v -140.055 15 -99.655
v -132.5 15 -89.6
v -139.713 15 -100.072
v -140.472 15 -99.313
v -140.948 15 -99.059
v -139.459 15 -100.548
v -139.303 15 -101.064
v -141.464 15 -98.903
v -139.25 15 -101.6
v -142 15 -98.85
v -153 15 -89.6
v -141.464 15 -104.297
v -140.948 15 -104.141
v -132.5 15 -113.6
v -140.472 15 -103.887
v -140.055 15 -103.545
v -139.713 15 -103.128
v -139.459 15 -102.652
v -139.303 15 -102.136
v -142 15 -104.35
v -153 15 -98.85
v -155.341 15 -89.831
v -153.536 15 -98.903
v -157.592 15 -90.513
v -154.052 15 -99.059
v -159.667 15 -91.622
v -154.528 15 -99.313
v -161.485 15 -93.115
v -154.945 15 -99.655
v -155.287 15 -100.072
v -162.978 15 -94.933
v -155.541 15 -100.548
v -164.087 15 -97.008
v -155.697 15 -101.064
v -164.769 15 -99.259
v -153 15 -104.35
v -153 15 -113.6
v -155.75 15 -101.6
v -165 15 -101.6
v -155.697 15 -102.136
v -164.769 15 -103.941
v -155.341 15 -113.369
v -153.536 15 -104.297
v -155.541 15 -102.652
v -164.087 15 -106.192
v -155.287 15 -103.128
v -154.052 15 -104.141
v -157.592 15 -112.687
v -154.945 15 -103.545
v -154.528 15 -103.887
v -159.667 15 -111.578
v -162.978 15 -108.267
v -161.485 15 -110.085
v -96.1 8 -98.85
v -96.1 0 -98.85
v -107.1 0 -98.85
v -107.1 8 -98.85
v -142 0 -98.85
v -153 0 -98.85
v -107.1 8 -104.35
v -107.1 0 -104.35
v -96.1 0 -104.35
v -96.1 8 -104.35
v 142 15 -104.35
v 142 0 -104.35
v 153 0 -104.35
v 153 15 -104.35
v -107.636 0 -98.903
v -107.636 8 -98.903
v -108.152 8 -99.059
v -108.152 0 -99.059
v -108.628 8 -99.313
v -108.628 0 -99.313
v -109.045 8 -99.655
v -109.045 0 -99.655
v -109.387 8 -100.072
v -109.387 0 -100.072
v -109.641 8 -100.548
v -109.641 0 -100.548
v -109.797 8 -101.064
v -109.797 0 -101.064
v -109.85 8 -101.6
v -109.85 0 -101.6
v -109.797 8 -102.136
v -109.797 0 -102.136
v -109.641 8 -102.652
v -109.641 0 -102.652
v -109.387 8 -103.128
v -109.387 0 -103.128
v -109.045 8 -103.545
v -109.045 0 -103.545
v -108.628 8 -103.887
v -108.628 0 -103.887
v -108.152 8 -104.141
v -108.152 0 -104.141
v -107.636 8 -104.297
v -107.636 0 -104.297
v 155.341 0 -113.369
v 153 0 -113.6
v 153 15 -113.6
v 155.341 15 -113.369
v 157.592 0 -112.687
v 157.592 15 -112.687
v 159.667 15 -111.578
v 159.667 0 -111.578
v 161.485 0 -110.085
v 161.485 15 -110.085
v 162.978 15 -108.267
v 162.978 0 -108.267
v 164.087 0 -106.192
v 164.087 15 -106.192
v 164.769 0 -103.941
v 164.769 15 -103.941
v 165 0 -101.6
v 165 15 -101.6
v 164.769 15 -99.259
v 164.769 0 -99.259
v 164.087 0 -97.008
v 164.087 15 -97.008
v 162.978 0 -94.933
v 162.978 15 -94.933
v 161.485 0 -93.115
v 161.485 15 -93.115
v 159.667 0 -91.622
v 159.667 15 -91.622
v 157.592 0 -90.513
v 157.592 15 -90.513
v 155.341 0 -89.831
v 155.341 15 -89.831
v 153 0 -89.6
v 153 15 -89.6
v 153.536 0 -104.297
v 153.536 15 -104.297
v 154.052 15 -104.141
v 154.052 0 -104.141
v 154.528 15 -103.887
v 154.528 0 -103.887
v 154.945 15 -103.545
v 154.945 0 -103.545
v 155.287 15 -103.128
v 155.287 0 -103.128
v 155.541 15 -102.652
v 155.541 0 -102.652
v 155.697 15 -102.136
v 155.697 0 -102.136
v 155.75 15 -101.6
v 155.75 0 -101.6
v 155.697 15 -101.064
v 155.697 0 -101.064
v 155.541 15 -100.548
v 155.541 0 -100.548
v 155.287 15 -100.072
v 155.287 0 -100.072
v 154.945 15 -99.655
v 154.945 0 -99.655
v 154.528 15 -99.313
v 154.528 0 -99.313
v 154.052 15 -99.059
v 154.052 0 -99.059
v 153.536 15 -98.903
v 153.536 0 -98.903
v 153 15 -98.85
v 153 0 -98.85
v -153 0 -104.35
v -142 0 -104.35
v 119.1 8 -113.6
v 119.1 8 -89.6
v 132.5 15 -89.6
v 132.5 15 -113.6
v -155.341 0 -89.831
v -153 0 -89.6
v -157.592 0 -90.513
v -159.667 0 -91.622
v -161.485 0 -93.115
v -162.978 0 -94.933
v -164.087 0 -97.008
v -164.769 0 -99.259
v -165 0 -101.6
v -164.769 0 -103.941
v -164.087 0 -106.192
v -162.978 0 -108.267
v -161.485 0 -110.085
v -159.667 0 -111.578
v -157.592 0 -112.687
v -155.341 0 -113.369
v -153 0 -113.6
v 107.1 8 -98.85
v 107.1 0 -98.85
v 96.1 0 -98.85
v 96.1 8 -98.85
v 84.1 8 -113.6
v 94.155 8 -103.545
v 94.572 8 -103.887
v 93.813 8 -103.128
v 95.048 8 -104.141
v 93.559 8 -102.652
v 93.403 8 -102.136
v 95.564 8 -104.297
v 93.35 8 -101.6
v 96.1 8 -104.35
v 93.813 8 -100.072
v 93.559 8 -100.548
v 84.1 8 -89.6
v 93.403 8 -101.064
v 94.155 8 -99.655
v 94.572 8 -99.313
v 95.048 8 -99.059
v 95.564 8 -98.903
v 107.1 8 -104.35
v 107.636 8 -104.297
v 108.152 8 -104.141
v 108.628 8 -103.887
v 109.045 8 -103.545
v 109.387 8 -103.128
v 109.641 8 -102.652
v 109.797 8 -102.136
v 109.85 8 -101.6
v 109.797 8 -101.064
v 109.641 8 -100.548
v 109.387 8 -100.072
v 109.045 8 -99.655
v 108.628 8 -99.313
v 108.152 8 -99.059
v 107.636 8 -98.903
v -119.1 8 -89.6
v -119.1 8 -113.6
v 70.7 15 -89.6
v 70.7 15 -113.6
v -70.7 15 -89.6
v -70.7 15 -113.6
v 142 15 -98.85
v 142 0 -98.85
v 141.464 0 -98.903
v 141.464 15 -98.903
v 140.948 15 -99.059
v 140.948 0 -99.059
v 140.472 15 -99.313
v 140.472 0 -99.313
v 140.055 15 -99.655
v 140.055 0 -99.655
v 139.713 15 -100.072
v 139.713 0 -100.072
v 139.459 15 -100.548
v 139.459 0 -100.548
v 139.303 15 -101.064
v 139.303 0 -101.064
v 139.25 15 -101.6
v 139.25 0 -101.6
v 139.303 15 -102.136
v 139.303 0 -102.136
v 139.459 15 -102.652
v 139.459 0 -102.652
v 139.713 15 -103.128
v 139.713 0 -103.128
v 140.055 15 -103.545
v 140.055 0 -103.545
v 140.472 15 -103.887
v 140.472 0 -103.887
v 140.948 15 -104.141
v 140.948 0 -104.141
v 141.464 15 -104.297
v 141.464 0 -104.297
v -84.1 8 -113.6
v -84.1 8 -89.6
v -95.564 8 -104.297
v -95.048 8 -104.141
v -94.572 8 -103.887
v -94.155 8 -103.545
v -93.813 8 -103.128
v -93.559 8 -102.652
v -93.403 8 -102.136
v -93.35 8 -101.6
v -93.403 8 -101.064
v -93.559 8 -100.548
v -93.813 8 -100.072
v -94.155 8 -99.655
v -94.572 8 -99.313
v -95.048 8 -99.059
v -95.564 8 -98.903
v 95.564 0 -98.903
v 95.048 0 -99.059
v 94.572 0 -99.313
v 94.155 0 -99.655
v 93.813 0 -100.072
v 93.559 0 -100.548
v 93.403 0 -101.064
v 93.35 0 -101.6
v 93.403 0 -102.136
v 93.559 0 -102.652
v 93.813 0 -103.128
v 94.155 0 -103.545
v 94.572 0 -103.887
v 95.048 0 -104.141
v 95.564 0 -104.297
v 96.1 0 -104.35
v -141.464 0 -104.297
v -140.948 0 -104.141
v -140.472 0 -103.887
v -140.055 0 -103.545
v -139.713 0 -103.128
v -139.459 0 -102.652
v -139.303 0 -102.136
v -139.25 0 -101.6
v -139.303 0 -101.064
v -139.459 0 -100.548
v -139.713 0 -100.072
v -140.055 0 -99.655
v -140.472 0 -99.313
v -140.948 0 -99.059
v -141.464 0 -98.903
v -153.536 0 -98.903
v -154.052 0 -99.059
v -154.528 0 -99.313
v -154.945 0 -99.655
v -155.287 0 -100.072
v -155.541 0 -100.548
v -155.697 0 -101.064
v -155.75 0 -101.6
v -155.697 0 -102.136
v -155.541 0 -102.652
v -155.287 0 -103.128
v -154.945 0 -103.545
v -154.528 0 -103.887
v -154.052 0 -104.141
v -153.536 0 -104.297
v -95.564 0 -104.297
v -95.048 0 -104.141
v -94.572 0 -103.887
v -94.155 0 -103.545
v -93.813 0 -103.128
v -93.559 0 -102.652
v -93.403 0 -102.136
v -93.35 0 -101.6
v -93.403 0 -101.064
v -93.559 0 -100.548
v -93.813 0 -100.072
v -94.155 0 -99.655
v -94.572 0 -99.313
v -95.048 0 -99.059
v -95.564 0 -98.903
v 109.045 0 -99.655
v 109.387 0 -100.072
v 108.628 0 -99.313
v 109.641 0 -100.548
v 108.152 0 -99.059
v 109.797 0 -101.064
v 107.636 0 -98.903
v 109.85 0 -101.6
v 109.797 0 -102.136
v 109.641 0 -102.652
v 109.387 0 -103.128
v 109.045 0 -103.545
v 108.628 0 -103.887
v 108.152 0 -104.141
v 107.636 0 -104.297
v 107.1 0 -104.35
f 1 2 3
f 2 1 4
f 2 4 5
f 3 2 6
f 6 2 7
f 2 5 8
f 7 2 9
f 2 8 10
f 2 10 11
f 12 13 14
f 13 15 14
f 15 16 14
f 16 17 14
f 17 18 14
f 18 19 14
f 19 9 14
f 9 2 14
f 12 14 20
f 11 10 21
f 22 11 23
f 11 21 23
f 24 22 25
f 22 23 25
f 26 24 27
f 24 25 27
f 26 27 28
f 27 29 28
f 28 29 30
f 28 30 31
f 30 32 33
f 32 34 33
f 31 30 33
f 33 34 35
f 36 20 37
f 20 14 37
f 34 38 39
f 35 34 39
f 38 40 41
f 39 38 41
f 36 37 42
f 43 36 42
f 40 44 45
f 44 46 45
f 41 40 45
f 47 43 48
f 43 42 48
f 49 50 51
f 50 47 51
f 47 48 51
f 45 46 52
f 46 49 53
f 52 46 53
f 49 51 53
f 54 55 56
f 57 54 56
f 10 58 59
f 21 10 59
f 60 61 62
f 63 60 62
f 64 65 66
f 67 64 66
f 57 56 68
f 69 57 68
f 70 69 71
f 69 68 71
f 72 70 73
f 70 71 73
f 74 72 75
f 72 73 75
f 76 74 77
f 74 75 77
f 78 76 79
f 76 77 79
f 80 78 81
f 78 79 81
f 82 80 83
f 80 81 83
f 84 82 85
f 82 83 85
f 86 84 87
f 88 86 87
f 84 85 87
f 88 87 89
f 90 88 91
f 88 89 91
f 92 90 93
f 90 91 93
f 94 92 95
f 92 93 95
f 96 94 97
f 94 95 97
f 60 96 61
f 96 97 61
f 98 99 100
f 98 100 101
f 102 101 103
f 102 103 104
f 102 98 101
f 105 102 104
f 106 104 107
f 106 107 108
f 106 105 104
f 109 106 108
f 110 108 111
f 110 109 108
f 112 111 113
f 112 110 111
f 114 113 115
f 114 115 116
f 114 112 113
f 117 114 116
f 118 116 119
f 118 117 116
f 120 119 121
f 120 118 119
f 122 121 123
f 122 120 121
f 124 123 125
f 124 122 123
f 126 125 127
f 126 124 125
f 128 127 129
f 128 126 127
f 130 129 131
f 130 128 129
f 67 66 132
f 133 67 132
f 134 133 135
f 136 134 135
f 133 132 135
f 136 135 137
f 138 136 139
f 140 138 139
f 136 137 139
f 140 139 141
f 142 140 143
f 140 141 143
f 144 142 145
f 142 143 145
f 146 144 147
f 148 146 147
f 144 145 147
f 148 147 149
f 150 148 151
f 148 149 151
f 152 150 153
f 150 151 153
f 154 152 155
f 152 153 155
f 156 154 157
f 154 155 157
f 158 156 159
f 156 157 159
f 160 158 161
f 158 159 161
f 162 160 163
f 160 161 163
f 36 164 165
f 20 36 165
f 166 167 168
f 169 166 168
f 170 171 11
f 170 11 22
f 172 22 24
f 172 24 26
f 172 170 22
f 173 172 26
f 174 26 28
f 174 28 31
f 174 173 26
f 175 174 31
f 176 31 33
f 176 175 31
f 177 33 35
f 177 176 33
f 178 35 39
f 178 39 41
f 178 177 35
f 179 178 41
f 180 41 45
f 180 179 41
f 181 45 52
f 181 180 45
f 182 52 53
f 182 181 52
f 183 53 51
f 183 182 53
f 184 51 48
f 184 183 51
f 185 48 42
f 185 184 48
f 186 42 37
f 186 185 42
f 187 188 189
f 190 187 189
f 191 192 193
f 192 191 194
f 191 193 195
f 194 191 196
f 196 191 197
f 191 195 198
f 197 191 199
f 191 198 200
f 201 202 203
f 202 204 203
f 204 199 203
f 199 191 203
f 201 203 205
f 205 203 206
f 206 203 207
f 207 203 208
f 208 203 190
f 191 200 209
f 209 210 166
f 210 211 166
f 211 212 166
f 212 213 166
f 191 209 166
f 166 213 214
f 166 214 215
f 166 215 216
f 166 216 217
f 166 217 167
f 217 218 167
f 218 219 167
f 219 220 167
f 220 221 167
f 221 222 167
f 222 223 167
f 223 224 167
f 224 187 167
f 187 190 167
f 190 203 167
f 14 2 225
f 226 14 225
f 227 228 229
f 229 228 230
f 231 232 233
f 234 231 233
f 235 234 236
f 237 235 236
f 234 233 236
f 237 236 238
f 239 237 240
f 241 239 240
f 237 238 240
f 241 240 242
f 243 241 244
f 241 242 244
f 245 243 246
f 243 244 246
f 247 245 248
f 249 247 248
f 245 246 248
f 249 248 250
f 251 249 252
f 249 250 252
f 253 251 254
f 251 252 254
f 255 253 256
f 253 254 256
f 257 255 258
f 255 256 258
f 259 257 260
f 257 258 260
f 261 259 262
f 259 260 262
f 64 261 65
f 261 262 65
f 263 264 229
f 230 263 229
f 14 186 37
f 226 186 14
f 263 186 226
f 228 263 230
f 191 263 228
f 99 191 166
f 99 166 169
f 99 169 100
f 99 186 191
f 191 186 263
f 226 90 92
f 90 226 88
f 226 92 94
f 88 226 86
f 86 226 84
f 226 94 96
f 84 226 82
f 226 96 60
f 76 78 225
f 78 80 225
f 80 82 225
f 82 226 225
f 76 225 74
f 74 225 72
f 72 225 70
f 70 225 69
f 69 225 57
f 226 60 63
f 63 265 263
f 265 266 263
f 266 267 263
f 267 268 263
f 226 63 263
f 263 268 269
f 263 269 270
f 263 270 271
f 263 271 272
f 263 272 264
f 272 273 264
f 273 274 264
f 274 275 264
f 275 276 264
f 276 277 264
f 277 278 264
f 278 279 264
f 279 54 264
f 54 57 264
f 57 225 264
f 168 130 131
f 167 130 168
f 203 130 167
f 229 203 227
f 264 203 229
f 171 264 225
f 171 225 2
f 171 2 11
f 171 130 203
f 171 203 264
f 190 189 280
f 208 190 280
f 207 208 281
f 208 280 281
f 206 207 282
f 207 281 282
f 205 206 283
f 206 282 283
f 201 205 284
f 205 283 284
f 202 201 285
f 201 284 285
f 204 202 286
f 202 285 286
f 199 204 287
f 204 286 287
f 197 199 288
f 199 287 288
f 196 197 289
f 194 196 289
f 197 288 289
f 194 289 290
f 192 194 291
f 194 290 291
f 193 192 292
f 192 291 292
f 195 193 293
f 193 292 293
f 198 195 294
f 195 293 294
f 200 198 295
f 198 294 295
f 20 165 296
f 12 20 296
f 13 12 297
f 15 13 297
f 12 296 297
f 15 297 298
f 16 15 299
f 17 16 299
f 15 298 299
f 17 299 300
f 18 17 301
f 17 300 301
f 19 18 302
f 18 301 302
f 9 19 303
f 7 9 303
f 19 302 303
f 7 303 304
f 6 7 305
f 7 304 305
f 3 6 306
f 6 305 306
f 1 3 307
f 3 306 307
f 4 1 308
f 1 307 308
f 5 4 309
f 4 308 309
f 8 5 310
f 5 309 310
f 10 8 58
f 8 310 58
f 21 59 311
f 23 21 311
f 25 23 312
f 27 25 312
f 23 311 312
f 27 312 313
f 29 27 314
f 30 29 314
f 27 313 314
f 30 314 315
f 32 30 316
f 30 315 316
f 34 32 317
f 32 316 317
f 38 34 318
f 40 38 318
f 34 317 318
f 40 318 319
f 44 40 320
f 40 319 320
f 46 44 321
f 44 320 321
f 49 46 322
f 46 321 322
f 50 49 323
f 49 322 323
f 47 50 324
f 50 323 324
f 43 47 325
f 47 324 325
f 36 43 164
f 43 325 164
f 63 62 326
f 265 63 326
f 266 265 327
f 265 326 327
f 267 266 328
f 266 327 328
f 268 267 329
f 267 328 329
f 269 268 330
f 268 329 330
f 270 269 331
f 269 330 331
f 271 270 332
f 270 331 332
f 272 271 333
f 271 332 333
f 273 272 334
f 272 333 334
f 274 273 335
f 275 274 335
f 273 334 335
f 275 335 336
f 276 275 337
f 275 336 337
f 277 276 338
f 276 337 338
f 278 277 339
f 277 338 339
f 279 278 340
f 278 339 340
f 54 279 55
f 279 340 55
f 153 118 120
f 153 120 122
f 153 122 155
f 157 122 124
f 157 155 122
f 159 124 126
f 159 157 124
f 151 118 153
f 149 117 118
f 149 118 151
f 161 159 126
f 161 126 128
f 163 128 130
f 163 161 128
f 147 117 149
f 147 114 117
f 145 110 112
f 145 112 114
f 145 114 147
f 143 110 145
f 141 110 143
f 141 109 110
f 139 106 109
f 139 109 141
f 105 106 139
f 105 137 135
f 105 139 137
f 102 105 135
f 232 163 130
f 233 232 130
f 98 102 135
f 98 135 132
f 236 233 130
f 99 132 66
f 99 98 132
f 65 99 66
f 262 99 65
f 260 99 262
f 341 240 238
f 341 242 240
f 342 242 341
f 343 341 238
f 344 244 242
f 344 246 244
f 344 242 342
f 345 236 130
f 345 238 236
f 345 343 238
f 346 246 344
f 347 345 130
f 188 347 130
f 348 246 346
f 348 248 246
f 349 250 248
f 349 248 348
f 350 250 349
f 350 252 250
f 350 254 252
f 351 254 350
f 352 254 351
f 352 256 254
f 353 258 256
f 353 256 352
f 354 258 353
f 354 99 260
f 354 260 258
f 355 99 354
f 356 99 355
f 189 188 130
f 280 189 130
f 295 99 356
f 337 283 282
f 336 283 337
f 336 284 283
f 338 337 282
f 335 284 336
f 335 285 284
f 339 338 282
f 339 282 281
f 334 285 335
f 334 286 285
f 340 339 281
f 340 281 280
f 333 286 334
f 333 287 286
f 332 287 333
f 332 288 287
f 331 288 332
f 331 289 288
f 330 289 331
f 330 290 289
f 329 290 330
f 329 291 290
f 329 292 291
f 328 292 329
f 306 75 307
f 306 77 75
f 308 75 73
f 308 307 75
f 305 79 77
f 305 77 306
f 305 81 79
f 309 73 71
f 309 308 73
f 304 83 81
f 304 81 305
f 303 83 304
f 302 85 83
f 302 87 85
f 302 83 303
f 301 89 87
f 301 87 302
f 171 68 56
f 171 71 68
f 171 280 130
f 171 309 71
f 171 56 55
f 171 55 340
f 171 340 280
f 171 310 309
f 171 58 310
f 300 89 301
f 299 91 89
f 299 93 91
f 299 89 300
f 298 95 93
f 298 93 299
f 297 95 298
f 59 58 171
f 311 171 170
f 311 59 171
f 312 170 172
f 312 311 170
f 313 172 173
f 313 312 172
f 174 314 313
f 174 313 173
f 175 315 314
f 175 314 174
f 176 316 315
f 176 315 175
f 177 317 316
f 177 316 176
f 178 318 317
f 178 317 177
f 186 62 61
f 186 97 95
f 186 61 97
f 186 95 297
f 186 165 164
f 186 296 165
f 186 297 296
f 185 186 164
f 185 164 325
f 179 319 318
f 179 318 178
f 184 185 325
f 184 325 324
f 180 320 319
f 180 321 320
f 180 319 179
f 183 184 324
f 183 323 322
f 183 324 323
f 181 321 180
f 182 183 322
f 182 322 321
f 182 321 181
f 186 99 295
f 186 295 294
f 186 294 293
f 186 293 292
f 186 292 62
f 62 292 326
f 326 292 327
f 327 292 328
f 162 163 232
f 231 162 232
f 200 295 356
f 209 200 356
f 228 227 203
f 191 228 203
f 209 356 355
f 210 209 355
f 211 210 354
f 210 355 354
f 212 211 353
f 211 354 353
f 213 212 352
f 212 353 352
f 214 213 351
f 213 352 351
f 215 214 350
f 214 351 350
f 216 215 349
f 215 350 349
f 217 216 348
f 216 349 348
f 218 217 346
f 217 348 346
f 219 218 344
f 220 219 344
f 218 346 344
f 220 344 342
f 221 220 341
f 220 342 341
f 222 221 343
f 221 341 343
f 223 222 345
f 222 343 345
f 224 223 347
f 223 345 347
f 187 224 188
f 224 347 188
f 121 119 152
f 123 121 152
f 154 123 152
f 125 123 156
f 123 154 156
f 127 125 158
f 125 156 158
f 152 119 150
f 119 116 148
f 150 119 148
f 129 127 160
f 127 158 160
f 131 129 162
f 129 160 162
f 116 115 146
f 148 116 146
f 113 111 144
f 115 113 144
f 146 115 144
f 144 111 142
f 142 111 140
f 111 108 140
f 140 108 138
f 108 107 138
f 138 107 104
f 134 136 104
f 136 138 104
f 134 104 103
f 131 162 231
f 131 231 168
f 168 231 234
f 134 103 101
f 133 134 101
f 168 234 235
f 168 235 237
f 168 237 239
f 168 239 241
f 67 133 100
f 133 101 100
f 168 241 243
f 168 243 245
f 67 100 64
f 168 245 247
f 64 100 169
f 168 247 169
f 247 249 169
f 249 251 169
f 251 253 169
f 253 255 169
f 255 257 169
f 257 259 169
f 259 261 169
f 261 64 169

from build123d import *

# Parameters (mm, degrees)
BOSS_EXTRUDE2_DEPTH = 15
CUT_EXTRUDE3_DEPTH  = 168.40967714


with BuildPart() as part:
    # Sketch1 → Boss-Extrude2 (new body)
    with BuildSketch(Plane(origin=(0, 0, 0), x_dir=(1, 0, 0), z_dir=(0, 1, 0))):
        with BuildLine():
            Line((-153, 113.6), (153, 113.6))
            ThreePointArc((153, 113.6), (165, 101.6), (153, 89.6))
            Line((153, 89.6), (-153, 89.6))
            ThreePointArc((-153, 89.6), (-165, 101.6), (-153, 113.6))
        make_face()
        with BuildLine():
            Line((-153, 104.35), (-142, 104.35))
            ThreePointArc((-142, 104.35), (-139.25, 101.6), (-142, 98.85))
            Line((-142, 98.85), (-153, 98.85))
            ThreePointArc((-153, 98.85), (-155.75, 101.6), (-153, 104.35))
        make_face(mode=Mode.SUBTRACT)
        with BuildLine():
            Line((-107.1, 104.35), (-96.1, 104.35))
            ThreePointArc((-96.1, 104.35), (-93.35, 101.6), (-96.1, 98.85))
            Line((-96.1, 98.85), (-107.1, 98.85))
            ThreePointArc((-107.1, 98.85), (-109.85, 101.6), (-107.1, 104.35))
        make_face(mode=Mode.SUBTRACT)
        with BuildLine():
            Line((96.1, 104.35), (107.1, 104.35))
            ThreePointArc((107.1, 104.35), (109.85, 101.6), (107.1, 98.85))
            Line((107.1, 98.85), (96.1, 98.85))
            ThreePointArc((96.1, 98.85), (93.35, 101.6), (96.1, 104.35))
        make_face(mode=Mode.SUBTRACT)
        with BuildLine():
            Line((153, 98.85), (142, 98.85))
            ThreePointArc((142, 98.85), (139.25, 101.6), (142, 104.35))
            Line((142, 104.35), (153, 104.35))
            ThreePointArc((153, 104.35), (155.75, 101.6), (153, 98.85))
        make_face(mode=Mode.SUBTRACT)
    extrude(amount=BOSS_EXTRUDE2_DEPTH)

    # Sketch4 → Cut-Extrude3 (cut, through all)
    with BuildSketch(Plane.XY.offset(-89.6)):
        Polygon((-132.5, 15), (-119.1, 8), (-84.1, 8), (-70.7, 15), align=None)
        Polygon((119.1, 8), (132.5, 15), (70.7, 15), (84.1, 8), align=None)
    extrude(amount=-CUT_EXTRUDE3_DEPTH, mode=Mode.SUBTRACT)


solid = part.part
